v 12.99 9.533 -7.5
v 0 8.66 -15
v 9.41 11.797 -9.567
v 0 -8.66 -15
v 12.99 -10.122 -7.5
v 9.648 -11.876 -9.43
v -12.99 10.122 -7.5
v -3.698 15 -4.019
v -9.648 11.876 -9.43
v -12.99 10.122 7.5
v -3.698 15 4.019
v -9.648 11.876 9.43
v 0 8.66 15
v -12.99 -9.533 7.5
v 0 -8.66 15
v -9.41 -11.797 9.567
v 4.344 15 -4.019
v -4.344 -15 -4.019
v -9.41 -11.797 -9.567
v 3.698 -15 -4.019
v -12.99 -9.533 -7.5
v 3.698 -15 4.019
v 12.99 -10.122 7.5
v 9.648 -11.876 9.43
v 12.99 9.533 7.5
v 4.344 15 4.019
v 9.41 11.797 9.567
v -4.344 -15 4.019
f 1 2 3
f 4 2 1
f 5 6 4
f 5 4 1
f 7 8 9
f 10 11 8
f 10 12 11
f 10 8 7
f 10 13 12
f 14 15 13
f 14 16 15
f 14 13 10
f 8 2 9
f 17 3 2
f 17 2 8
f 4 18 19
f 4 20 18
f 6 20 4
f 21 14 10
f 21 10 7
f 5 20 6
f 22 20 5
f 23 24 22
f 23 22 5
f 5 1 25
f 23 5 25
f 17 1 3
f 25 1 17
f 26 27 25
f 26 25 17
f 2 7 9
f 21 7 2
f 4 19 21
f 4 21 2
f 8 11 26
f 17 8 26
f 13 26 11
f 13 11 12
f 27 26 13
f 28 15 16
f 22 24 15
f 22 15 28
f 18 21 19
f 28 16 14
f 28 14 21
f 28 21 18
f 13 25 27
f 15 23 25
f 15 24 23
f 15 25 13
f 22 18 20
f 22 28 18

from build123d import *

# Parameters (mm, degrees)
F1_DEPTH = 15
F3_DEPTH = 15
F5_DEPTH = 15


with BuildPart() as f1:
    # F0 (on Top) → F1 (new body, symmetric)
    with BuildSketch(Plane.XY):
        Polygon((14.639726, -9.256264), (15.336023, 8.050243), (0.696296, 17.306507), (-14.639726, 9.256264), (-15.336023, -8.050243), (-0.696296, -17.306507), align=None)
    extrude(amount=F1_DEPTH, both=True)

    # F2 (on Right) → F3 (intersect, symmetric)
    with BuildSketch(Plane.YZ):
        Polygon((8.660254, 15), (-8.660254, 15), (-17.320508, 0), (-8.660254, -15), (8.660254, -15), (17.320508, 0), align=None)
    extrude(amount=F3_DEPTH, both=True, mode=Mode.INTERSECT)

    # F4 (on Front) → F5 (intersect, symmetric)
    with BuildSketch(Plane.XZ):
        Polygon((-12.990381, 7.5), (-12.990381, -7.5), (0, -15), (12.990381, -7.5), (12.990381, 7.5), (0, 15), align=None)
    extrude(amount=F5_DEPTH, both=True, mode=Mode.INTERSECT)


solid = f1.part
